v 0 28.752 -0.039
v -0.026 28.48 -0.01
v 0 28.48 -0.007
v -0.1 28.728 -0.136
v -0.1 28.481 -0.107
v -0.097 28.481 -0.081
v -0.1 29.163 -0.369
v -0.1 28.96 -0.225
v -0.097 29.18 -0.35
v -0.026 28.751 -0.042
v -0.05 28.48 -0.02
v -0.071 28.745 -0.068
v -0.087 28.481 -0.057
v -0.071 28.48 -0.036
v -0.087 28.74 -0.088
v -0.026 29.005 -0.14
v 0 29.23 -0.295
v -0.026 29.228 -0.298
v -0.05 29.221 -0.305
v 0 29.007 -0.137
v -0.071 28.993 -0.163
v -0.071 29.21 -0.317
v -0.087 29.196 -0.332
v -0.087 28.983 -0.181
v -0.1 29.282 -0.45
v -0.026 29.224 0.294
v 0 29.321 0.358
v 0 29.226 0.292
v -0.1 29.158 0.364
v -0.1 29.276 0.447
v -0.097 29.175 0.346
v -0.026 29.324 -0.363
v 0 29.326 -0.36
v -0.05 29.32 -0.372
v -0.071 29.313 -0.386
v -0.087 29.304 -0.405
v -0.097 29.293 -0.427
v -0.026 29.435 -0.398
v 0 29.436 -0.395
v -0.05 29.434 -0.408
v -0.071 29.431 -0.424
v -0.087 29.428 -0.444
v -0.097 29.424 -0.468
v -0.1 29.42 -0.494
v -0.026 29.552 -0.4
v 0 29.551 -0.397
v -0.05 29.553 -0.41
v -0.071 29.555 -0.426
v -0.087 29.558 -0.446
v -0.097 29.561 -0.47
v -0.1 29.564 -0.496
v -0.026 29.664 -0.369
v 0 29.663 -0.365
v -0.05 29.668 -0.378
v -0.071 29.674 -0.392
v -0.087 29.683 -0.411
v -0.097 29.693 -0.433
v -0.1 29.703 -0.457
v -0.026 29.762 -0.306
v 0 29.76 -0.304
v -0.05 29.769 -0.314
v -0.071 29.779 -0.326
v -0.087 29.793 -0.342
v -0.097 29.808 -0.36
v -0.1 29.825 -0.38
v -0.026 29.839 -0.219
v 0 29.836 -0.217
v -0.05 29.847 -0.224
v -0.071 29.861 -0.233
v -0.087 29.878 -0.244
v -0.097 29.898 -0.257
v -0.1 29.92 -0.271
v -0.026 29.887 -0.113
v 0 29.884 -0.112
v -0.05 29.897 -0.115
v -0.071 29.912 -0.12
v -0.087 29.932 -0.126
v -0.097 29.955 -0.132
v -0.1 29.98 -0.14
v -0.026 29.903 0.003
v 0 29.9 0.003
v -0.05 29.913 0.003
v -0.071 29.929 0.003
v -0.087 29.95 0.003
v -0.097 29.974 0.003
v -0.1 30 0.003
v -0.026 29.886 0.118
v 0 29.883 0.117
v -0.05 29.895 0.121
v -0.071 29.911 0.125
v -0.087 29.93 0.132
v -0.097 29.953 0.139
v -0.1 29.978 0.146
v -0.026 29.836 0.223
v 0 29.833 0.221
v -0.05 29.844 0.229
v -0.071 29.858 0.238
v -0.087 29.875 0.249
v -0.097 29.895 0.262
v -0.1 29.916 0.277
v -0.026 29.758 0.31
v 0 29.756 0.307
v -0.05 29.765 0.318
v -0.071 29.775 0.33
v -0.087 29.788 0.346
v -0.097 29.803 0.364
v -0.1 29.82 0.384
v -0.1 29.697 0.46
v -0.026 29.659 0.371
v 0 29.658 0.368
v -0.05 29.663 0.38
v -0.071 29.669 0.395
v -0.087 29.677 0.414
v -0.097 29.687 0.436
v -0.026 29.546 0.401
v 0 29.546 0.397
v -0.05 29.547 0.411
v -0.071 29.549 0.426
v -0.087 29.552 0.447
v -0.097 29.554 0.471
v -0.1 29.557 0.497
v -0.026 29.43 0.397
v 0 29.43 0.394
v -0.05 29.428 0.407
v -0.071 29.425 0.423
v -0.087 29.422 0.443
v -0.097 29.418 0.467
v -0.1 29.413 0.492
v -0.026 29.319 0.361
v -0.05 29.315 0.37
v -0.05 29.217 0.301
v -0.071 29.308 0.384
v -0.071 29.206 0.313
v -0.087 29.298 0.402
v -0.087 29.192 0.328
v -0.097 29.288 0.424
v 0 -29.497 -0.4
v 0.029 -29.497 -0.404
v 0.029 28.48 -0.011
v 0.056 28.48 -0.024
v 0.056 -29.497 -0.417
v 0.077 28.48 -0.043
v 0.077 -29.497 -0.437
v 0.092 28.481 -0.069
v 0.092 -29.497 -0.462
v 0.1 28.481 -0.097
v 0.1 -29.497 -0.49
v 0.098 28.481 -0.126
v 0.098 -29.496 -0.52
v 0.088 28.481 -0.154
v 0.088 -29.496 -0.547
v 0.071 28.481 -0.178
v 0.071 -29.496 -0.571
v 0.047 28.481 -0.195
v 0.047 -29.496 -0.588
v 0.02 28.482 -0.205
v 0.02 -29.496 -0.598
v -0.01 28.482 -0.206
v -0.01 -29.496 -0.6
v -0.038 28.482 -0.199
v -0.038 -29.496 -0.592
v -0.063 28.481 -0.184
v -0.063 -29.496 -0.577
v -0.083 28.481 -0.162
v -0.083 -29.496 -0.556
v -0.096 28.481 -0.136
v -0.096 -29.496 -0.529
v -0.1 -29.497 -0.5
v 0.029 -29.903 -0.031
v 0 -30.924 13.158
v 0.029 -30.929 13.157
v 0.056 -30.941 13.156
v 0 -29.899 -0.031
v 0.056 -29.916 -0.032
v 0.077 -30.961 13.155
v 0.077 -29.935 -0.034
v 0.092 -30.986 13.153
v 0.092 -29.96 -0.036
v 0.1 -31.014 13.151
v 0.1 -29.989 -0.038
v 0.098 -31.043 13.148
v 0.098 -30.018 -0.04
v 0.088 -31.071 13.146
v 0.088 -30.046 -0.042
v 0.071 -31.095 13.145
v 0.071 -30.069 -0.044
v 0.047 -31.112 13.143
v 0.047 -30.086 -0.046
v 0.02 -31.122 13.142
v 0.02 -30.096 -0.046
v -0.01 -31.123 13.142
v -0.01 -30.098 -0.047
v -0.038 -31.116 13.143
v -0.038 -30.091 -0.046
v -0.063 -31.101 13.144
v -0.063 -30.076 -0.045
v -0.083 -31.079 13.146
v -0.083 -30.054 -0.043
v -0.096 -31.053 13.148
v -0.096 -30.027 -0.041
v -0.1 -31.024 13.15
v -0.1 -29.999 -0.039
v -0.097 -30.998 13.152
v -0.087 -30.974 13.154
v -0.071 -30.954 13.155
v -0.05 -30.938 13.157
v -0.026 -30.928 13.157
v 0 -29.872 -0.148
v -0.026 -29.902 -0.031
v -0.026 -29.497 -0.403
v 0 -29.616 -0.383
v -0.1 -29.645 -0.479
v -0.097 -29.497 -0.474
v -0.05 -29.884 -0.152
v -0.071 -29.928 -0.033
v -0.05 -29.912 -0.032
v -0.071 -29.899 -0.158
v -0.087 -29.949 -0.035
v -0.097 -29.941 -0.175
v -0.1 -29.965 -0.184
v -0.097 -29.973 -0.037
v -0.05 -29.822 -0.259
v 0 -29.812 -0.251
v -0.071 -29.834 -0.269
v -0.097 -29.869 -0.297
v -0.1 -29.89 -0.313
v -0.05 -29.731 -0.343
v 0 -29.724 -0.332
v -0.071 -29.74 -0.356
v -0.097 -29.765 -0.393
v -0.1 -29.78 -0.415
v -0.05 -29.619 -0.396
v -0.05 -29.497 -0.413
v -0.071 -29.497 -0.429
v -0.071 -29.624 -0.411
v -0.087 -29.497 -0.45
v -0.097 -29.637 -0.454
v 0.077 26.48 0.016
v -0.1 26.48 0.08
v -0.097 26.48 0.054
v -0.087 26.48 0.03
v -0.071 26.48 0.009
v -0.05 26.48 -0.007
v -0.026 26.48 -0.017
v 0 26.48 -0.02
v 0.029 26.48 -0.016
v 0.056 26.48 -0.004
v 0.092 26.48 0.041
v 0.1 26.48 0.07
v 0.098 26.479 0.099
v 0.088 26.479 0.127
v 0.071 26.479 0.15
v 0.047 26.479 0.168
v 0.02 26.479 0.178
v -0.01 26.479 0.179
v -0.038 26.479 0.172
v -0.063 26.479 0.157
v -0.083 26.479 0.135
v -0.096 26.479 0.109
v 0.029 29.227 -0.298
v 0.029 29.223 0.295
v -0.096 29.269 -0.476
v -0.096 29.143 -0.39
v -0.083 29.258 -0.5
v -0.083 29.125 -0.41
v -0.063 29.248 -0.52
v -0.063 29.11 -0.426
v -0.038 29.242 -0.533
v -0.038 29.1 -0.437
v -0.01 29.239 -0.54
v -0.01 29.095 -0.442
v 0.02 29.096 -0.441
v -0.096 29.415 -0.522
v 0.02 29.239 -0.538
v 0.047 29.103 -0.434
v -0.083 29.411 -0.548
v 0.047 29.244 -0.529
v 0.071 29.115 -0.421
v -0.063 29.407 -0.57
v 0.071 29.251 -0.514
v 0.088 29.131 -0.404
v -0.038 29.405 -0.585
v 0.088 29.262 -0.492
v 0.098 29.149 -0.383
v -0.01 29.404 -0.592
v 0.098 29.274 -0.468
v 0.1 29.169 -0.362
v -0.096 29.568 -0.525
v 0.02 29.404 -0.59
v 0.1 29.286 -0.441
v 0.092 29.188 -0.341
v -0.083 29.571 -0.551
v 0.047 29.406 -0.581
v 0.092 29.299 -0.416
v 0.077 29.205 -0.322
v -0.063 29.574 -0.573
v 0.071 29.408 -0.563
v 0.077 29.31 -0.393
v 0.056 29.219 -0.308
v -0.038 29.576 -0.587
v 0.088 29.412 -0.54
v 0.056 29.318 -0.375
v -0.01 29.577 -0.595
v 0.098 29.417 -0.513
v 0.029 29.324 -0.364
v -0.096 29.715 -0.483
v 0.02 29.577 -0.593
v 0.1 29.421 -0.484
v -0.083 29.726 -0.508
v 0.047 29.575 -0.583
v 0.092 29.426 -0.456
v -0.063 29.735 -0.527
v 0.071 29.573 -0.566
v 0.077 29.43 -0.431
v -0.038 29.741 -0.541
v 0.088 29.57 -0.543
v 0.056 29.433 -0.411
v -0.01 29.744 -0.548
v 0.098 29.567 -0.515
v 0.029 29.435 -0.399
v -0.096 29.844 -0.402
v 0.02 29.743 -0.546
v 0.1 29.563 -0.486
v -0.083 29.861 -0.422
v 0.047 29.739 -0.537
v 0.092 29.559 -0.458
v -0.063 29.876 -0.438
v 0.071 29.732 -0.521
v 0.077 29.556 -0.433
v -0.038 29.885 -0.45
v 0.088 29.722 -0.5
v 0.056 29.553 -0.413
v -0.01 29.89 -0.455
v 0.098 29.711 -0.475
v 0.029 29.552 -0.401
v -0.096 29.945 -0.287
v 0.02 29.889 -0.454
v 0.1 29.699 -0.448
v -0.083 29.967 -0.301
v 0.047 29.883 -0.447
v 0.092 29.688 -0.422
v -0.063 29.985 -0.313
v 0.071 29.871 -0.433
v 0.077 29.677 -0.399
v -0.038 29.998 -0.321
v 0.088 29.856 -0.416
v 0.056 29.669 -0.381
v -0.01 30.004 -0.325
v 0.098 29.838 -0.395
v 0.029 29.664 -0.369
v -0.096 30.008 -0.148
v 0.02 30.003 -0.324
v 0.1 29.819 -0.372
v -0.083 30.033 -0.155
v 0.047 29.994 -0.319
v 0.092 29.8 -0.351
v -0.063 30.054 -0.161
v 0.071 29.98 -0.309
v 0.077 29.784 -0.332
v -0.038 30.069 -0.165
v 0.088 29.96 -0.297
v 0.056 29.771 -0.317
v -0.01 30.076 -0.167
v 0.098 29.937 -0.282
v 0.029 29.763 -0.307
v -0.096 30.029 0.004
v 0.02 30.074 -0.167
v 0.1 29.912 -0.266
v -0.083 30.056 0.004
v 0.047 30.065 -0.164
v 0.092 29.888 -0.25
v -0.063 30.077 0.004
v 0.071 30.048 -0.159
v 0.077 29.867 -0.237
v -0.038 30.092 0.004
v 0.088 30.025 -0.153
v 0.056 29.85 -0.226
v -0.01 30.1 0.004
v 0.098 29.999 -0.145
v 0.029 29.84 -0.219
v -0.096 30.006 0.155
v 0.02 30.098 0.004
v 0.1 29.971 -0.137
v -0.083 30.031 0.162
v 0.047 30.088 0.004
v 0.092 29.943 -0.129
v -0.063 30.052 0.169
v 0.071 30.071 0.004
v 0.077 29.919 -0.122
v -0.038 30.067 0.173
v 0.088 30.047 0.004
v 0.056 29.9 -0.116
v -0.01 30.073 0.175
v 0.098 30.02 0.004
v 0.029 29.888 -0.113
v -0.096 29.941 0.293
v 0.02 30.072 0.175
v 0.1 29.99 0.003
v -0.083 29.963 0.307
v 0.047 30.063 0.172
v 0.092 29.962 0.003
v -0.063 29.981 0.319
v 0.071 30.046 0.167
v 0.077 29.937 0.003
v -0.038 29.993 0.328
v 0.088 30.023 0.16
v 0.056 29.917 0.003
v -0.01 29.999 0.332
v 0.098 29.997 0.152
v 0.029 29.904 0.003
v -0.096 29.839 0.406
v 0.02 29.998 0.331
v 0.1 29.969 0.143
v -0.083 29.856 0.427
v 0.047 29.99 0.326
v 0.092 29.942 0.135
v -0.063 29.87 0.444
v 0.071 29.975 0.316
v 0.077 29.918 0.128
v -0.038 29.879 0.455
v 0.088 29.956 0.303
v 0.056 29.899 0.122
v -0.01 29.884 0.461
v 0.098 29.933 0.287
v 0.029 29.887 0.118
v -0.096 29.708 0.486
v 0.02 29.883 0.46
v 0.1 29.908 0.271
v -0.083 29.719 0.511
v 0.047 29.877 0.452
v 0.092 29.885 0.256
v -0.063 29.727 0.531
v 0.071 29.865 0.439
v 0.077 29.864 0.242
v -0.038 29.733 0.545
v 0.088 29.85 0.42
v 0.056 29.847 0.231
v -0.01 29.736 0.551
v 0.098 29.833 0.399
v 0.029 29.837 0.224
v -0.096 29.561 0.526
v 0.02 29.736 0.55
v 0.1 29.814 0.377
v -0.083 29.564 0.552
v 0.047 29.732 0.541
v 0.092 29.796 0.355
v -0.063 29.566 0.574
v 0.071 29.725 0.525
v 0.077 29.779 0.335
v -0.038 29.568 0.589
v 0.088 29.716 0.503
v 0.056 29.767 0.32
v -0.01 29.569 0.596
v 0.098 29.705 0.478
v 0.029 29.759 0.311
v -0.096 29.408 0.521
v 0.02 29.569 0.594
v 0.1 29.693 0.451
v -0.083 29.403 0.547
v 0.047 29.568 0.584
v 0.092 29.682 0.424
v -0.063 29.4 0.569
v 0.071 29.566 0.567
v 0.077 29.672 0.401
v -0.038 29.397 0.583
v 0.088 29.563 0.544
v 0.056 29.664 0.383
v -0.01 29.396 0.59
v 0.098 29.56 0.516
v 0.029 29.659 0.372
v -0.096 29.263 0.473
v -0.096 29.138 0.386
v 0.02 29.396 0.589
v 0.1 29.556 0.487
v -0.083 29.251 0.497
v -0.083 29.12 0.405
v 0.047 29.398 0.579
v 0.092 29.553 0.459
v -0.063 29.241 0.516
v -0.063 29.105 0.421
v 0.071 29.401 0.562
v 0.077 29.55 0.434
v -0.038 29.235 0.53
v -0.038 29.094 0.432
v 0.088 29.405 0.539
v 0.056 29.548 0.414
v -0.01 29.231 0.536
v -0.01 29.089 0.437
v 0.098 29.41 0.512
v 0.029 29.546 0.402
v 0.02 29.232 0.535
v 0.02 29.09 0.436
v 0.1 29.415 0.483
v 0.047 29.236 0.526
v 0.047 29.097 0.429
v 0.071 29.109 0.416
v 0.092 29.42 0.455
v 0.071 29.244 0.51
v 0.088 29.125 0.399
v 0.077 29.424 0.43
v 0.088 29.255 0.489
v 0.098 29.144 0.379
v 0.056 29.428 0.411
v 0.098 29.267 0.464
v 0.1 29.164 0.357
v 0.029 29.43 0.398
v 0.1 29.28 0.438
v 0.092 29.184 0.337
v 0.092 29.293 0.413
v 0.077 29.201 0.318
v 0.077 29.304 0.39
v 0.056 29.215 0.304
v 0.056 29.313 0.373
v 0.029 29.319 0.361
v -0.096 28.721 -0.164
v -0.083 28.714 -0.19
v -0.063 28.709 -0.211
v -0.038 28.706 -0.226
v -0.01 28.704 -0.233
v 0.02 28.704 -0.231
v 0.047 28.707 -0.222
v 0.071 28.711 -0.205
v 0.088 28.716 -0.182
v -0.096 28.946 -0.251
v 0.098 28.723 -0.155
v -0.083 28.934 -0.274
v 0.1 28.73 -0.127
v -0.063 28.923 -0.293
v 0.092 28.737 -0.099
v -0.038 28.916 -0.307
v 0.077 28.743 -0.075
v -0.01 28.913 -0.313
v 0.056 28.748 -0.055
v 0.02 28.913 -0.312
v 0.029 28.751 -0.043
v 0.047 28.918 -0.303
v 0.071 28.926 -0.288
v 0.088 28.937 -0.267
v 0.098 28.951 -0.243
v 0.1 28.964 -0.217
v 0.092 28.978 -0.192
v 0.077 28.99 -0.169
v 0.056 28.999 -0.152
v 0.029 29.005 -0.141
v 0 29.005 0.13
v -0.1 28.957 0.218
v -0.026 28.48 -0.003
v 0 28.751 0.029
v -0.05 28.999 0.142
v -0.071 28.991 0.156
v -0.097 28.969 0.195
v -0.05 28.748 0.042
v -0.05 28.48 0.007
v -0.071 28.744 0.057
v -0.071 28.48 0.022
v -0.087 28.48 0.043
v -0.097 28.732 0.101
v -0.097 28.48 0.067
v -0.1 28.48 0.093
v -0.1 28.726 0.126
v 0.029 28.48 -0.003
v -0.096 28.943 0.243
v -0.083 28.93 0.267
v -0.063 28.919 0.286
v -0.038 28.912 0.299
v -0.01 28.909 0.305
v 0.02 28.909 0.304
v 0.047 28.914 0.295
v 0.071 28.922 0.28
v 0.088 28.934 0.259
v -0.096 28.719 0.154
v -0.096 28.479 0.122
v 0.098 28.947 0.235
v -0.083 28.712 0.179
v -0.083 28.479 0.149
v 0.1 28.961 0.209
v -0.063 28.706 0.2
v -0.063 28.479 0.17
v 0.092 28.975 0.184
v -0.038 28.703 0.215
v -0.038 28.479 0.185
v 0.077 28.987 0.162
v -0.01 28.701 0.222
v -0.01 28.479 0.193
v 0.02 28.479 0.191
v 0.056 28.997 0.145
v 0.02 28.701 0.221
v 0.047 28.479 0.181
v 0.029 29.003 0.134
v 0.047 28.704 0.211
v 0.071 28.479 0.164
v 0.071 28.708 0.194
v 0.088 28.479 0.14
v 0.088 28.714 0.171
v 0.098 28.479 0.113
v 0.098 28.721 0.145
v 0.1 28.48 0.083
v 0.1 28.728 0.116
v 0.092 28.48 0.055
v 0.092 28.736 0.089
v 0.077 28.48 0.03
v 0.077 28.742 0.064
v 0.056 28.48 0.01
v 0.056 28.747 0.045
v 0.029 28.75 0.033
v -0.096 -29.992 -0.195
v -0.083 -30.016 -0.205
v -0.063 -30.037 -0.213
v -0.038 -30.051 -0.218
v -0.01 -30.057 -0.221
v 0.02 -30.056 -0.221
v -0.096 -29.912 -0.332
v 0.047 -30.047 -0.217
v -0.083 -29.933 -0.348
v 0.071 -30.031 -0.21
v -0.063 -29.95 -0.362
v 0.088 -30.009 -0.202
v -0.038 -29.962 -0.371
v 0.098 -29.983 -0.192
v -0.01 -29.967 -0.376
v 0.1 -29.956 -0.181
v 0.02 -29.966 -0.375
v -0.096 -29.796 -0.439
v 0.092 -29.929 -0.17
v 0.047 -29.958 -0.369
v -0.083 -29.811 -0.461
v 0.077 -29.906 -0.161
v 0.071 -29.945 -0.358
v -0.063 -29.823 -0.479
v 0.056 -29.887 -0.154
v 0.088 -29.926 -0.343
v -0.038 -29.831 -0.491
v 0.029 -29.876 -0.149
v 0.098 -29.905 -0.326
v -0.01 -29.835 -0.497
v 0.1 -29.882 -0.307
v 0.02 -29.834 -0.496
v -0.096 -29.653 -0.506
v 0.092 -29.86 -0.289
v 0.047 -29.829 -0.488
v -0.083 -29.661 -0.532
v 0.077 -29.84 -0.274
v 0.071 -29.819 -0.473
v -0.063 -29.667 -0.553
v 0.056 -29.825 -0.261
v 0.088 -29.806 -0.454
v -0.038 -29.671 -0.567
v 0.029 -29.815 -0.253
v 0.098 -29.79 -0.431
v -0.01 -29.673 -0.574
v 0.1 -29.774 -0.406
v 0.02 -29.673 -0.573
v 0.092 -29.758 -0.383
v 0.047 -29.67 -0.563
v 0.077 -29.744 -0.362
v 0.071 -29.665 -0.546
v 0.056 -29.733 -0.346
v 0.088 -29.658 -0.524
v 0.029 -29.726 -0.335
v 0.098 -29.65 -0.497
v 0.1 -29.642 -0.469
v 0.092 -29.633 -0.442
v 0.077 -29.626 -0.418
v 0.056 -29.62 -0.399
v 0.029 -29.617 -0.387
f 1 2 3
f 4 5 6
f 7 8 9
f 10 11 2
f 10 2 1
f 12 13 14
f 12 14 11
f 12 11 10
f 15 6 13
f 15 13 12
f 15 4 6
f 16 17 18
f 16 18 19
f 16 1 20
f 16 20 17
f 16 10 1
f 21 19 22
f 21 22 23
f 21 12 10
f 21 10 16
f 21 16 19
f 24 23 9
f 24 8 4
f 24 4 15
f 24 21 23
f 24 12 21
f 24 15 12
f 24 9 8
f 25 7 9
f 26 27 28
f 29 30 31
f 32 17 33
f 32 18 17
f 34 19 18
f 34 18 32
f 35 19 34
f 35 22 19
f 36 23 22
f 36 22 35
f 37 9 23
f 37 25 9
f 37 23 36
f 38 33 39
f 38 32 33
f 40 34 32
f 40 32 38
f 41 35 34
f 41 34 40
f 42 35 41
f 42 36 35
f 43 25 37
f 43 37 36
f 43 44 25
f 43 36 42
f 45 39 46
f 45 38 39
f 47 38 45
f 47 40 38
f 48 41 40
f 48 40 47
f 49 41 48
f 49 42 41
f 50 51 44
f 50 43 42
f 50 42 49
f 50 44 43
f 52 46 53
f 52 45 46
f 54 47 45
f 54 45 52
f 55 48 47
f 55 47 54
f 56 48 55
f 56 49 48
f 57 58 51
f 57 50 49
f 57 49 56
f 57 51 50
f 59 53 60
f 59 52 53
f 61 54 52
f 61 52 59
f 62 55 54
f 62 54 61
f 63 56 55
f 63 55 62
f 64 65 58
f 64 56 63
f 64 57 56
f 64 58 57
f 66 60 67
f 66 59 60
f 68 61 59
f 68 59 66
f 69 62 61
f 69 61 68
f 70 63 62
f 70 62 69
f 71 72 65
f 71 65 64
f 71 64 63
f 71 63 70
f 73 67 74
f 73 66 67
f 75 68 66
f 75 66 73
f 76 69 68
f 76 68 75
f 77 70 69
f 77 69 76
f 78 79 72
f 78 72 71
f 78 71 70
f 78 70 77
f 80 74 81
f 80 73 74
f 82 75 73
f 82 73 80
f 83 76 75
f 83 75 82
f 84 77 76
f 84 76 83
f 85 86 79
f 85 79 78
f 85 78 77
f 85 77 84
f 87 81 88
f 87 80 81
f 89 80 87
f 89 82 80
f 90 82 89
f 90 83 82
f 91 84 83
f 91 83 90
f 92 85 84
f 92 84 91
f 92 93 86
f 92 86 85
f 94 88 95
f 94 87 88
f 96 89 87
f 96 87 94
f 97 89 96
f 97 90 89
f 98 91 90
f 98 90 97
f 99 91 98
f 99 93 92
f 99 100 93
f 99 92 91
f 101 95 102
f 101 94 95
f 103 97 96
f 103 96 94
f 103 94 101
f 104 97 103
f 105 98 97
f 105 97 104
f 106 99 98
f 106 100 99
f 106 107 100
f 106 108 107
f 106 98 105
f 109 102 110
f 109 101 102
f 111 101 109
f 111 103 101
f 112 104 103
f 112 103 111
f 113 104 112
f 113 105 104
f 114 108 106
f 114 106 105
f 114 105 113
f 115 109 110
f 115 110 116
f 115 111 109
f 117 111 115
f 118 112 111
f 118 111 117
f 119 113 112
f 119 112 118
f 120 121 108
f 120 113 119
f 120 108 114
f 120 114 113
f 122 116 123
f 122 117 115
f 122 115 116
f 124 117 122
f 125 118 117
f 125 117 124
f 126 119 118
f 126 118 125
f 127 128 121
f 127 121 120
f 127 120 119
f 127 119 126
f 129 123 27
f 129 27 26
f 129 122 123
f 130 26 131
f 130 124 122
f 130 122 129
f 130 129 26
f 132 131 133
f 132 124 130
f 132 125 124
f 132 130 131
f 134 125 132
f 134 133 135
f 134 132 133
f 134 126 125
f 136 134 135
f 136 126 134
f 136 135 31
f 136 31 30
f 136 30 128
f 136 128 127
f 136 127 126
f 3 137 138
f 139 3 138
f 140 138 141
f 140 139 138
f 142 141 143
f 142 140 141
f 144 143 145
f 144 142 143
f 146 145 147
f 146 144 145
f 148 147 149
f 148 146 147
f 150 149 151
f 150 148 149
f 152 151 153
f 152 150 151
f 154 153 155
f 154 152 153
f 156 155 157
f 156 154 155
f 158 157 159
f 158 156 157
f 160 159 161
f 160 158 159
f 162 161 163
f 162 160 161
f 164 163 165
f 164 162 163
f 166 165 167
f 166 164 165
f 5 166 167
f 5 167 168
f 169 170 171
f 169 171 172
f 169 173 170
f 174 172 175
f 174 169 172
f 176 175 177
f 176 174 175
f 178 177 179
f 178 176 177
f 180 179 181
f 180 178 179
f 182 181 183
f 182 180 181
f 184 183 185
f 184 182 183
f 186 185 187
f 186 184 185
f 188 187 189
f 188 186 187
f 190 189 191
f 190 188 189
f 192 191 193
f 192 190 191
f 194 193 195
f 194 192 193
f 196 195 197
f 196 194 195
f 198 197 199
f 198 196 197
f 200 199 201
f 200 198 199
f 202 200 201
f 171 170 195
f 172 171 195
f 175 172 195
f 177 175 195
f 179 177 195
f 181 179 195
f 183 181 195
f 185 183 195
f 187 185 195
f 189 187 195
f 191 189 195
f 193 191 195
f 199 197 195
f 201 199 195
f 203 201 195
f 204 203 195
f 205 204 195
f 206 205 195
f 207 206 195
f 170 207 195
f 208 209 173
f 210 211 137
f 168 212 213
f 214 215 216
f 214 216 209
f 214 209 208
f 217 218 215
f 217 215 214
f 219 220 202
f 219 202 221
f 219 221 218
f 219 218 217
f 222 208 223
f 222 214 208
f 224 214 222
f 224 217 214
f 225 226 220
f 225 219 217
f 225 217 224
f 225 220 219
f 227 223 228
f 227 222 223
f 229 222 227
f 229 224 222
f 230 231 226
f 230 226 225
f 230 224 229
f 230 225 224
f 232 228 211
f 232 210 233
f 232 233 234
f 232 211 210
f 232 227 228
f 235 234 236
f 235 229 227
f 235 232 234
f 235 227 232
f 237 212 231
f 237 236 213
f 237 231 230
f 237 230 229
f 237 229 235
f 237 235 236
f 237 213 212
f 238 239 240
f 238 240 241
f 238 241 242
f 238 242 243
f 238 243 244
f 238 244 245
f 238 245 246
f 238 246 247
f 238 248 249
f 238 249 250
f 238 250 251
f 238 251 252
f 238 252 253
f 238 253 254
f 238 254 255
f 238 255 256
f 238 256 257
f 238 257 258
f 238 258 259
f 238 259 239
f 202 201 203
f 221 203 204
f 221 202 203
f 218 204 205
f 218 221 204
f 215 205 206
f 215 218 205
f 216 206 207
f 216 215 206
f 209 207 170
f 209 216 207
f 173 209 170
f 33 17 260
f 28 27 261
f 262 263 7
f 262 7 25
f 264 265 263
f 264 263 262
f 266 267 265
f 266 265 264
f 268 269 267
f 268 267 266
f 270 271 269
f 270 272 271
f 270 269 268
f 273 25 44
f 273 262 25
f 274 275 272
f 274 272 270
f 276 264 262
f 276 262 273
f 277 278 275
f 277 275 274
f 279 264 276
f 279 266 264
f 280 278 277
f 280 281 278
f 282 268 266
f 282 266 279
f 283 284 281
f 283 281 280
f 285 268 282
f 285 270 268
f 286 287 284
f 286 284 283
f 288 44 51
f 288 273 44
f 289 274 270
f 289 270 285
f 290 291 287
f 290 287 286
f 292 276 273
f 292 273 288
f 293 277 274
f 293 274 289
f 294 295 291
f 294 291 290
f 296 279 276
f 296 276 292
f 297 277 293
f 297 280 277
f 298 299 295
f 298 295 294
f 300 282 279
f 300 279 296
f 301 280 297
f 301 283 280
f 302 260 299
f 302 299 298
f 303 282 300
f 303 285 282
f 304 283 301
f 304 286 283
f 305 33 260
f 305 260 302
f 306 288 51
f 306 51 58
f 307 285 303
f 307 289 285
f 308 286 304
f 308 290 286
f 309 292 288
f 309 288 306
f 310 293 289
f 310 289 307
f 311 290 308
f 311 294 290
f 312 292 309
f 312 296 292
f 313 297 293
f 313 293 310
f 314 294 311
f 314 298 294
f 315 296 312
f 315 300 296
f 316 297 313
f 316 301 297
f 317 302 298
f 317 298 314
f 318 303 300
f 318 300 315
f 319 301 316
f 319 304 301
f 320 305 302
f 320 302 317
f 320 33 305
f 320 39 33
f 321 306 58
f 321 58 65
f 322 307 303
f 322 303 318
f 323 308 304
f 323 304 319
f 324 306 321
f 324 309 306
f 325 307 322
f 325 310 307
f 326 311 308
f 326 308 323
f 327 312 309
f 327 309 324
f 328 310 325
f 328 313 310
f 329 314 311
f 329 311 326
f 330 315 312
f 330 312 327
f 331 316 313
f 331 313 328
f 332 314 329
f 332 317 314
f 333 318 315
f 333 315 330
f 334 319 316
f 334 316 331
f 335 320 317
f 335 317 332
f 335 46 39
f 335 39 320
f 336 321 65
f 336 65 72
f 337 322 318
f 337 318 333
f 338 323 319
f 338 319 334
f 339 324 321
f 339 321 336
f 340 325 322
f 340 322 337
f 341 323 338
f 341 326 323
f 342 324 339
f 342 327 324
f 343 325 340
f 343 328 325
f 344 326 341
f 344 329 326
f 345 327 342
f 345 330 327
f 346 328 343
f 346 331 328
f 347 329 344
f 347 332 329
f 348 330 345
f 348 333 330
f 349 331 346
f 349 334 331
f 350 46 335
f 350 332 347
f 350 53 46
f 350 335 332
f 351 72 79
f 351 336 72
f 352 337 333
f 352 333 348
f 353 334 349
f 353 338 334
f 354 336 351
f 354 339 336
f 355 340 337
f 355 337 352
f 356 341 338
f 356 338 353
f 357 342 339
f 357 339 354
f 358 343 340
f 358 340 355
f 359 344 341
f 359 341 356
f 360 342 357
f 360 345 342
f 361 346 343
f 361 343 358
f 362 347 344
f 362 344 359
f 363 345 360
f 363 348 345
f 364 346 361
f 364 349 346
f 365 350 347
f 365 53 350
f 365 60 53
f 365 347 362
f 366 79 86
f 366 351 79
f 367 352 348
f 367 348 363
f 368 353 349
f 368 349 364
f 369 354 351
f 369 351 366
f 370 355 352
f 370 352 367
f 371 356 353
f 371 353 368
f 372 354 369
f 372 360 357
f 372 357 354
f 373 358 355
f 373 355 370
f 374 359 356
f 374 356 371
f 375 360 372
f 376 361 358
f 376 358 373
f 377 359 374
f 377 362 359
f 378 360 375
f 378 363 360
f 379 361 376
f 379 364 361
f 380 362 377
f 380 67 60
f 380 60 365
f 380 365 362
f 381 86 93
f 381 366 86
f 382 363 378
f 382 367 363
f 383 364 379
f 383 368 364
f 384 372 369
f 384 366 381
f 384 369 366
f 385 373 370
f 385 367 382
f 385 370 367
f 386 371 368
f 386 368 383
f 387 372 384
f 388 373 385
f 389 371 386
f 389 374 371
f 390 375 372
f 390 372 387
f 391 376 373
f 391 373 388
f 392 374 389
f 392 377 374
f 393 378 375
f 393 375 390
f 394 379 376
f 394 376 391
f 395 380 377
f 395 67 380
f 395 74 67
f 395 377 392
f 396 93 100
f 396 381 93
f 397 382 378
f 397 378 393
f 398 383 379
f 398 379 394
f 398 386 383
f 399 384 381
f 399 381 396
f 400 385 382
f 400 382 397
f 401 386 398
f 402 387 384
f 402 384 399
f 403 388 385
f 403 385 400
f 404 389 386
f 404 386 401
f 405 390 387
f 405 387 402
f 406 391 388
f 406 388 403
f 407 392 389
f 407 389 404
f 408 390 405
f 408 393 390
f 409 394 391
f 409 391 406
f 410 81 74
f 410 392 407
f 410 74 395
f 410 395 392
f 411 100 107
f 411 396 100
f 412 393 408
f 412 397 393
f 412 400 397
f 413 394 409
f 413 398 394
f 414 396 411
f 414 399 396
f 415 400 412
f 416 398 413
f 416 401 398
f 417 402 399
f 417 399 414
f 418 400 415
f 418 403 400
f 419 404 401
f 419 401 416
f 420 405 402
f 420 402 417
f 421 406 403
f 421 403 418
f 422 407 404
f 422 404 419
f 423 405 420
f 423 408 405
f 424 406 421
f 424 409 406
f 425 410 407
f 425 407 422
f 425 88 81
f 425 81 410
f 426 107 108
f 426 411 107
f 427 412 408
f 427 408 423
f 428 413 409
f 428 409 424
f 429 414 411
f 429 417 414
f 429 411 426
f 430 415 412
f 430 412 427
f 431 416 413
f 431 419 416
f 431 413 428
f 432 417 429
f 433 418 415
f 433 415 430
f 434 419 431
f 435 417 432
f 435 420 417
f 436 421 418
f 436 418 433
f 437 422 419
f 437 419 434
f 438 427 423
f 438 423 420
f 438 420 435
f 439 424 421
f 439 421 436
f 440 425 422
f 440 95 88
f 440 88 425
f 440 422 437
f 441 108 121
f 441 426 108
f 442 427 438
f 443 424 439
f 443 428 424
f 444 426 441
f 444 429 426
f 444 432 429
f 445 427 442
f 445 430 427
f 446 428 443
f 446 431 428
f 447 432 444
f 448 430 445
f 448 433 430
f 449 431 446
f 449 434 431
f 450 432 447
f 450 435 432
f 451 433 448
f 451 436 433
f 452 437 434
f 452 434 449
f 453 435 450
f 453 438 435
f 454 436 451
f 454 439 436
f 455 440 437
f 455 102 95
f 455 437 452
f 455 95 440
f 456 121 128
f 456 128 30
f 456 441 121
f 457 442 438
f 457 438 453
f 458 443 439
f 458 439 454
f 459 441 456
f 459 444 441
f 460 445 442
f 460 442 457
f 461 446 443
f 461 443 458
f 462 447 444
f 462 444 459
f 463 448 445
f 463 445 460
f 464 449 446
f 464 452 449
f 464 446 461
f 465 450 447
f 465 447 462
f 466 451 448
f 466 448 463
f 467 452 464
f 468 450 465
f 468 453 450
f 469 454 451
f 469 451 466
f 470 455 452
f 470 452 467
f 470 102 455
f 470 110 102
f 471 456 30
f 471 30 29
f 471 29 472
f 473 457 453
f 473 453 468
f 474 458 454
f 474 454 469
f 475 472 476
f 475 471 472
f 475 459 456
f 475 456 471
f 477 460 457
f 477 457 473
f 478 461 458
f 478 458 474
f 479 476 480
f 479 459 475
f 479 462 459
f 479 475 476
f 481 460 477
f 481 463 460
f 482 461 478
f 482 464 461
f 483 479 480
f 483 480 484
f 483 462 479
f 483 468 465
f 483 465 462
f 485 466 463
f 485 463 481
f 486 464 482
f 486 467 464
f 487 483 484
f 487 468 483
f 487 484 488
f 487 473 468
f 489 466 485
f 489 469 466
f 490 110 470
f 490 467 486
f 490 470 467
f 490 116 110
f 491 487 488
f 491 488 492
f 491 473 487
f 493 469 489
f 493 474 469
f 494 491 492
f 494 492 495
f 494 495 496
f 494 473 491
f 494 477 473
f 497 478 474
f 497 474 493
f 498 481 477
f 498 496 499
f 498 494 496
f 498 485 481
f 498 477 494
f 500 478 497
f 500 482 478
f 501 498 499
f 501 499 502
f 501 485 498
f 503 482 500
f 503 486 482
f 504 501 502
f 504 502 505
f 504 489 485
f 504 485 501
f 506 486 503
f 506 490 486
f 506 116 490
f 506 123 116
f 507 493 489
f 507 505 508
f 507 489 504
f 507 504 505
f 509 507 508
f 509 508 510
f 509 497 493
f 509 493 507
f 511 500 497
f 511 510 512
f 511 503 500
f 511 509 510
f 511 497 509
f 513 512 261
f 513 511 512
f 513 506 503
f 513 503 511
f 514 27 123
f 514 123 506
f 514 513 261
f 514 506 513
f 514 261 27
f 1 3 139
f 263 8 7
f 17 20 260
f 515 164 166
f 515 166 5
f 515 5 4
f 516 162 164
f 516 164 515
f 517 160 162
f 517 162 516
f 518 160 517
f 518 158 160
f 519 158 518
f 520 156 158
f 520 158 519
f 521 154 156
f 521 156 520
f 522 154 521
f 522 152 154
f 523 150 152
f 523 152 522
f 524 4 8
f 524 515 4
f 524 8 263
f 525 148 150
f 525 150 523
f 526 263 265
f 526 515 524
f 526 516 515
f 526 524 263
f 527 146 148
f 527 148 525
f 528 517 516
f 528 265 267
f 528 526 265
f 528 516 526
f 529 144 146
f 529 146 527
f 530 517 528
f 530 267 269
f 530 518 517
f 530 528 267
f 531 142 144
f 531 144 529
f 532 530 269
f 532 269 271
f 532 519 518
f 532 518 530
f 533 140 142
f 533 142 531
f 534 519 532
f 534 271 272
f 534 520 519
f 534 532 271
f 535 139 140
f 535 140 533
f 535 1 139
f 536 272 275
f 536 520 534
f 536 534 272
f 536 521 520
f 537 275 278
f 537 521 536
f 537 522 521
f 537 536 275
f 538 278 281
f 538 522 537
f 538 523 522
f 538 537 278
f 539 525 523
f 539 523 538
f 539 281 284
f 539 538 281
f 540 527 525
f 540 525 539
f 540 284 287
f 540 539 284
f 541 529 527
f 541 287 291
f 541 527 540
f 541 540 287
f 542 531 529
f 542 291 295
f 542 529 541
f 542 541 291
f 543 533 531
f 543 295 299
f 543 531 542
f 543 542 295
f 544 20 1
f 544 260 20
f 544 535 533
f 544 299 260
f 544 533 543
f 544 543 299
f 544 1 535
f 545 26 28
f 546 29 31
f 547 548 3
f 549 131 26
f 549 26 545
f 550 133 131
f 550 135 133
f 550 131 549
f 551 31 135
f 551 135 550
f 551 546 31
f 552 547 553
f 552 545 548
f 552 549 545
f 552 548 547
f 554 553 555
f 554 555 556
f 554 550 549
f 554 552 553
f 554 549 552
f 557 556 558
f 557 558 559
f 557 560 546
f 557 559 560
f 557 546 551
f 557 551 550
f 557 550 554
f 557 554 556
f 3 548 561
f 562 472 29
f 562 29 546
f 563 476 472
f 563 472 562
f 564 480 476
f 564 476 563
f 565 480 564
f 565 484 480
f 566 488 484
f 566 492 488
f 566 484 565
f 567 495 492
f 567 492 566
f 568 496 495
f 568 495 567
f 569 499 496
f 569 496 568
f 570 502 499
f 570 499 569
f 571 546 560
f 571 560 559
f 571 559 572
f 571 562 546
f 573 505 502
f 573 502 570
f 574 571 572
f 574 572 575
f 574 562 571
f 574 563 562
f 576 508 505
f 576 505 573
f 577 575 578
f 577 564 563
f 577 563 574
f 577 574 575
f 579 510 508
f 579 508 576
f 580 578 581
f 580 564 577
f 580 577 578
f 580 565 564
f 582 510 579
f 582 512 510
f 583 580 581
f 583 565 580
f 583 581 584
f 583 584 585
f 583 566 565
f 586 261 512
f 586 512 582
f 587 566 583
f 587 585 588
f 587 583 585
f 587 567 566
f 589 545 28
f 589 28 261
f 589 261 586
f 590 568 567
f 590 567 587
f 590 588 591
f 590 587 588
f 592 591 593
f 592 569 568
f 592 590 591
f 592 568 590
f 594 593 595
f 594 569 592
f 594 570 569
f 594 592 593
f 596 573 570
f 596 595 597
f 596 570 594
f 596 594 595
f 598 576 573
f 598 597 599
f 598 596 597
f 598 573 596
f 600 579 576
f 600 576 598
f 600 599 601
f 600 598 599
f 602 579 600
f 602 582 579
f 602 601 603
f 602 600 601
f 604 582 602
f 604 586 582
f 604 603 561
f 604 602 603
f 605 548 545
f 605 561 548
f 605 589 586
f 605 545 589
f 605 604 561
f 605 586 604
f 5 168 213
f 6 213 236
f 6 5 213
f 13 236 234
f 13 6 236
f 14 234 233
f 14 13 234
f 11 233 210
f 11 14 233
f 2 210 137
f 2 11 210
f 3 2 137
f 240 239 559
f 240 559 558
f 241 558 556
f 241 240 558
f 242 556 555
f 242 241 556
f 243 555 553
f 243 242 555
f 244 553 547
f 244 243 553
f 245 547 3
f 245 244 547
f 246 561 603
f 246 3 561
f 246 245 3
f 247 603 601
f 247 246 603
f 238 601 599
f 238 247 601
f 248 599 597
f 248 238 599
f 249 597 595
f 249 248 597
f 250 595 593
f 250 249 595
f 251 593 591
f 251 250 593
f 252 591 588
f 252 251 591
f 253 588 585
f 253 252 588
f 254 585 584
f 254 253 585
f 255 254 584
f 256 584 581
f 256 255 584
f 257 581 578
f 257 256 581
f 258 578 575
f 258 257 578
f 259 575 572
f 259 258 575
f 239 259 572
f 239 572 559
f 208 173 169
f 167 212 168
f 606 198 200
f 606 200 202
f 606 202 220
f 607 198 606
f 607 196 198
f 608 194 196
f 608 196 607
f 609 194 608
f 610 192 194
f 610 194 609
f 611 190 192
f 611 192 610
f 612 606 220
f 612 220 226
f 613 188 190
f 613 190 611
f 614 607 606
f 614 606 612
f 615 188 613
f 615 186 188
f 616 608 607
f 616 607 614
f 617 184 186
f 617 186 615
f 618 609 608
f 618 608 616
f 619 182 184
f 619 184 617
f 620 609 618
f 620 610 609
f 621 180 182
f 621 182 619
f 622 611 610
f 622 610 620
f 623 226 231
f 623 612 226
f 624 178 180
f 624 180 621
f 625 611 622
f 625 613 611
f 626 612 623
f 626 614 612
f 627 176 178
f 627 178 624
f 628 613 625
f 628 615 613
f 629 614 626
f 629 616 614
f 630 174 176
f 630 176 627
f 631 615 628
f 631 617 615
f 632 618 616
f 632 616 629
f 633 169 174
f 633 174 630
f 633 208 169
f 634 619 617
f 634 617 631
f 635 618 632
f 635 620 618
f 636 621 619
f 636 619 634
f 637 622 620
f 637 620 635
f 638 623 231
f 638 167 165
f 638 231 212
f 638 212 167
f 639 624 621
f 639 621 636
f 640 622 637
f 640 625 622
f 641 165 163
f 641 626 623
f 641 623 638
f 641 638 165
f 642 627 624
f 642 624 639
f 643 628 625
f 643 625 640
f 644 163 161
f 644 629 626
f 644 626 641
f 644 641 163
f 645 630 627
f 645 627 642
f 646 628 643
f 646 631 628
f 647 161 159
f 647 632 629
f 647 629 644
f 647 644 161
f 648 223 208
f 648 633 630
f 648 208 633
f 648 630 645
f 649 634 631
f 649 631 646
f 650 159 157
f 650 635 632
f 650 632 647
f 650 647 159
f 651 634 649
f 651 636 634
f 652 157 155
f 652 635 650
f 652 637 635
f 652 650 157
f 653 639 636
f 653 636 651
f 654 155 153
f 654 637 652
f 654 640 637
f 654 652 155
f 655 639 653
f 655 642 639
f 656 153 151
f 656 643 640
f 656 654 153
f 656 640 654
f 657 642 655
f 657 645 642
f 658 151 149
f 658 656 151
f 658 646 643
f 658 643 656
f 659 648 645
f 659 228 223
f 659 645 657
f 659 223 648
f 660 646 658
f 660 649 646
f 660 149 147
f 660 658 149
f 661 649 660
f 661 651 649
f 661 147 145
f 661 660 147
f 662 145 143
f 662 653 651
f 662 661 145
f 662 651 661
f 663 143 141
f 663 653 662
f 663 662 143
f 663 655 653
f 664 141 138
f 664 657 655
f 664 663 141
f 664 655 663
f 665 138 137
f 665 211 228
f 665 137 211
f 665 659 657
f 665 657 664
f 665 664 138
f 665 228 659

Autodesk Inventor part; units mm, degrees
ref_plane "YZ Plane" through (0, 0, 0) normal (1, 0, 0) x (0, 1, 0)
ref_plane "XY Plane" through (0, 0, 0) normal (0, 0, 1) x (1, 0, 0)
sketch "Sketch2" plane through (0, 0, 0) normal (1, 0, 0) x (0, 1, 0)
  circle A0 centre (-29.5, 0) radius 0.4 construction
  circle A1 centre (29.5, 0) radius 0.4 construction
  line L0 (-29.5, 0) -> (29.5, 0) construction
  line L1 (-31.024, 13.15) -> (-29.9985, -0.0388)
  arc A2 (-29.9985, -0.0388) -> (-29.4966, -0.5) centre (-29.5, 0) ccw
  line L2 (-29.4966, -0.5) -> (28.4809, -0.1069)
  arc A3 (29.1626, -0.369) -> (28.4809, -0.1069) centre (28.4877, -1.1069) ccw
  arc A4 (29.1626, -0.369) -> (29.1576, 0.3644) centre (29.5, 0) ccw
  arc A5 (28.4795, 0.0931) -> (29.1576, 0.3644) centre (28.4728, 1.0931) ccw
  line L3 (28.4795, 0.0931) -> (26.4796, 0.0795)
  circle A6 centre (29.1626, -0.369) radius 0.1 construction
  line L4 (28.4795, 0.0931) -> (28.4809, -0.1069) construction
  line L5 (28.4802, -0.0069) -> (29.5, 0) construction
  point P0 (0, 0)
  point P1 (0, 0)
  dimension "d5" = 0.8
  dimension "d6" = 59
  dimension "d7" = 0.2
  dimension "d8" = 0.2
  dimension "d9" = 1
  dimension "d10" = 2
  dimension "d11" = 1.524
  dimension "d12" = 13.15
ref_plane "Work Plane1" through (0, 29.5, 0) normal (0, 1, 0) x (-1, 0, 0)
sketch "Sketch3" plane through (0, 29.5, 0) normal (0, 1, 0) x (-1, 0, 0)
  line L0 (0, 0.5) -> (0, -0.5) projected
  circle A0 centre (0, -0.5) radius 0.1
  point P0 (0, 0)
  point P1 (0, -0.369)
  point P2 (0, 0.3644)
  dimension "d13" = 0.2
sweep "Sweep1" add profiles "Sketch3" path "Sketch2"
equation "\"d8\" = d7"
equation "\"d13\" = d7"
properties part number "+XPanel_AntennaString" material "Acrylic, Clear"
